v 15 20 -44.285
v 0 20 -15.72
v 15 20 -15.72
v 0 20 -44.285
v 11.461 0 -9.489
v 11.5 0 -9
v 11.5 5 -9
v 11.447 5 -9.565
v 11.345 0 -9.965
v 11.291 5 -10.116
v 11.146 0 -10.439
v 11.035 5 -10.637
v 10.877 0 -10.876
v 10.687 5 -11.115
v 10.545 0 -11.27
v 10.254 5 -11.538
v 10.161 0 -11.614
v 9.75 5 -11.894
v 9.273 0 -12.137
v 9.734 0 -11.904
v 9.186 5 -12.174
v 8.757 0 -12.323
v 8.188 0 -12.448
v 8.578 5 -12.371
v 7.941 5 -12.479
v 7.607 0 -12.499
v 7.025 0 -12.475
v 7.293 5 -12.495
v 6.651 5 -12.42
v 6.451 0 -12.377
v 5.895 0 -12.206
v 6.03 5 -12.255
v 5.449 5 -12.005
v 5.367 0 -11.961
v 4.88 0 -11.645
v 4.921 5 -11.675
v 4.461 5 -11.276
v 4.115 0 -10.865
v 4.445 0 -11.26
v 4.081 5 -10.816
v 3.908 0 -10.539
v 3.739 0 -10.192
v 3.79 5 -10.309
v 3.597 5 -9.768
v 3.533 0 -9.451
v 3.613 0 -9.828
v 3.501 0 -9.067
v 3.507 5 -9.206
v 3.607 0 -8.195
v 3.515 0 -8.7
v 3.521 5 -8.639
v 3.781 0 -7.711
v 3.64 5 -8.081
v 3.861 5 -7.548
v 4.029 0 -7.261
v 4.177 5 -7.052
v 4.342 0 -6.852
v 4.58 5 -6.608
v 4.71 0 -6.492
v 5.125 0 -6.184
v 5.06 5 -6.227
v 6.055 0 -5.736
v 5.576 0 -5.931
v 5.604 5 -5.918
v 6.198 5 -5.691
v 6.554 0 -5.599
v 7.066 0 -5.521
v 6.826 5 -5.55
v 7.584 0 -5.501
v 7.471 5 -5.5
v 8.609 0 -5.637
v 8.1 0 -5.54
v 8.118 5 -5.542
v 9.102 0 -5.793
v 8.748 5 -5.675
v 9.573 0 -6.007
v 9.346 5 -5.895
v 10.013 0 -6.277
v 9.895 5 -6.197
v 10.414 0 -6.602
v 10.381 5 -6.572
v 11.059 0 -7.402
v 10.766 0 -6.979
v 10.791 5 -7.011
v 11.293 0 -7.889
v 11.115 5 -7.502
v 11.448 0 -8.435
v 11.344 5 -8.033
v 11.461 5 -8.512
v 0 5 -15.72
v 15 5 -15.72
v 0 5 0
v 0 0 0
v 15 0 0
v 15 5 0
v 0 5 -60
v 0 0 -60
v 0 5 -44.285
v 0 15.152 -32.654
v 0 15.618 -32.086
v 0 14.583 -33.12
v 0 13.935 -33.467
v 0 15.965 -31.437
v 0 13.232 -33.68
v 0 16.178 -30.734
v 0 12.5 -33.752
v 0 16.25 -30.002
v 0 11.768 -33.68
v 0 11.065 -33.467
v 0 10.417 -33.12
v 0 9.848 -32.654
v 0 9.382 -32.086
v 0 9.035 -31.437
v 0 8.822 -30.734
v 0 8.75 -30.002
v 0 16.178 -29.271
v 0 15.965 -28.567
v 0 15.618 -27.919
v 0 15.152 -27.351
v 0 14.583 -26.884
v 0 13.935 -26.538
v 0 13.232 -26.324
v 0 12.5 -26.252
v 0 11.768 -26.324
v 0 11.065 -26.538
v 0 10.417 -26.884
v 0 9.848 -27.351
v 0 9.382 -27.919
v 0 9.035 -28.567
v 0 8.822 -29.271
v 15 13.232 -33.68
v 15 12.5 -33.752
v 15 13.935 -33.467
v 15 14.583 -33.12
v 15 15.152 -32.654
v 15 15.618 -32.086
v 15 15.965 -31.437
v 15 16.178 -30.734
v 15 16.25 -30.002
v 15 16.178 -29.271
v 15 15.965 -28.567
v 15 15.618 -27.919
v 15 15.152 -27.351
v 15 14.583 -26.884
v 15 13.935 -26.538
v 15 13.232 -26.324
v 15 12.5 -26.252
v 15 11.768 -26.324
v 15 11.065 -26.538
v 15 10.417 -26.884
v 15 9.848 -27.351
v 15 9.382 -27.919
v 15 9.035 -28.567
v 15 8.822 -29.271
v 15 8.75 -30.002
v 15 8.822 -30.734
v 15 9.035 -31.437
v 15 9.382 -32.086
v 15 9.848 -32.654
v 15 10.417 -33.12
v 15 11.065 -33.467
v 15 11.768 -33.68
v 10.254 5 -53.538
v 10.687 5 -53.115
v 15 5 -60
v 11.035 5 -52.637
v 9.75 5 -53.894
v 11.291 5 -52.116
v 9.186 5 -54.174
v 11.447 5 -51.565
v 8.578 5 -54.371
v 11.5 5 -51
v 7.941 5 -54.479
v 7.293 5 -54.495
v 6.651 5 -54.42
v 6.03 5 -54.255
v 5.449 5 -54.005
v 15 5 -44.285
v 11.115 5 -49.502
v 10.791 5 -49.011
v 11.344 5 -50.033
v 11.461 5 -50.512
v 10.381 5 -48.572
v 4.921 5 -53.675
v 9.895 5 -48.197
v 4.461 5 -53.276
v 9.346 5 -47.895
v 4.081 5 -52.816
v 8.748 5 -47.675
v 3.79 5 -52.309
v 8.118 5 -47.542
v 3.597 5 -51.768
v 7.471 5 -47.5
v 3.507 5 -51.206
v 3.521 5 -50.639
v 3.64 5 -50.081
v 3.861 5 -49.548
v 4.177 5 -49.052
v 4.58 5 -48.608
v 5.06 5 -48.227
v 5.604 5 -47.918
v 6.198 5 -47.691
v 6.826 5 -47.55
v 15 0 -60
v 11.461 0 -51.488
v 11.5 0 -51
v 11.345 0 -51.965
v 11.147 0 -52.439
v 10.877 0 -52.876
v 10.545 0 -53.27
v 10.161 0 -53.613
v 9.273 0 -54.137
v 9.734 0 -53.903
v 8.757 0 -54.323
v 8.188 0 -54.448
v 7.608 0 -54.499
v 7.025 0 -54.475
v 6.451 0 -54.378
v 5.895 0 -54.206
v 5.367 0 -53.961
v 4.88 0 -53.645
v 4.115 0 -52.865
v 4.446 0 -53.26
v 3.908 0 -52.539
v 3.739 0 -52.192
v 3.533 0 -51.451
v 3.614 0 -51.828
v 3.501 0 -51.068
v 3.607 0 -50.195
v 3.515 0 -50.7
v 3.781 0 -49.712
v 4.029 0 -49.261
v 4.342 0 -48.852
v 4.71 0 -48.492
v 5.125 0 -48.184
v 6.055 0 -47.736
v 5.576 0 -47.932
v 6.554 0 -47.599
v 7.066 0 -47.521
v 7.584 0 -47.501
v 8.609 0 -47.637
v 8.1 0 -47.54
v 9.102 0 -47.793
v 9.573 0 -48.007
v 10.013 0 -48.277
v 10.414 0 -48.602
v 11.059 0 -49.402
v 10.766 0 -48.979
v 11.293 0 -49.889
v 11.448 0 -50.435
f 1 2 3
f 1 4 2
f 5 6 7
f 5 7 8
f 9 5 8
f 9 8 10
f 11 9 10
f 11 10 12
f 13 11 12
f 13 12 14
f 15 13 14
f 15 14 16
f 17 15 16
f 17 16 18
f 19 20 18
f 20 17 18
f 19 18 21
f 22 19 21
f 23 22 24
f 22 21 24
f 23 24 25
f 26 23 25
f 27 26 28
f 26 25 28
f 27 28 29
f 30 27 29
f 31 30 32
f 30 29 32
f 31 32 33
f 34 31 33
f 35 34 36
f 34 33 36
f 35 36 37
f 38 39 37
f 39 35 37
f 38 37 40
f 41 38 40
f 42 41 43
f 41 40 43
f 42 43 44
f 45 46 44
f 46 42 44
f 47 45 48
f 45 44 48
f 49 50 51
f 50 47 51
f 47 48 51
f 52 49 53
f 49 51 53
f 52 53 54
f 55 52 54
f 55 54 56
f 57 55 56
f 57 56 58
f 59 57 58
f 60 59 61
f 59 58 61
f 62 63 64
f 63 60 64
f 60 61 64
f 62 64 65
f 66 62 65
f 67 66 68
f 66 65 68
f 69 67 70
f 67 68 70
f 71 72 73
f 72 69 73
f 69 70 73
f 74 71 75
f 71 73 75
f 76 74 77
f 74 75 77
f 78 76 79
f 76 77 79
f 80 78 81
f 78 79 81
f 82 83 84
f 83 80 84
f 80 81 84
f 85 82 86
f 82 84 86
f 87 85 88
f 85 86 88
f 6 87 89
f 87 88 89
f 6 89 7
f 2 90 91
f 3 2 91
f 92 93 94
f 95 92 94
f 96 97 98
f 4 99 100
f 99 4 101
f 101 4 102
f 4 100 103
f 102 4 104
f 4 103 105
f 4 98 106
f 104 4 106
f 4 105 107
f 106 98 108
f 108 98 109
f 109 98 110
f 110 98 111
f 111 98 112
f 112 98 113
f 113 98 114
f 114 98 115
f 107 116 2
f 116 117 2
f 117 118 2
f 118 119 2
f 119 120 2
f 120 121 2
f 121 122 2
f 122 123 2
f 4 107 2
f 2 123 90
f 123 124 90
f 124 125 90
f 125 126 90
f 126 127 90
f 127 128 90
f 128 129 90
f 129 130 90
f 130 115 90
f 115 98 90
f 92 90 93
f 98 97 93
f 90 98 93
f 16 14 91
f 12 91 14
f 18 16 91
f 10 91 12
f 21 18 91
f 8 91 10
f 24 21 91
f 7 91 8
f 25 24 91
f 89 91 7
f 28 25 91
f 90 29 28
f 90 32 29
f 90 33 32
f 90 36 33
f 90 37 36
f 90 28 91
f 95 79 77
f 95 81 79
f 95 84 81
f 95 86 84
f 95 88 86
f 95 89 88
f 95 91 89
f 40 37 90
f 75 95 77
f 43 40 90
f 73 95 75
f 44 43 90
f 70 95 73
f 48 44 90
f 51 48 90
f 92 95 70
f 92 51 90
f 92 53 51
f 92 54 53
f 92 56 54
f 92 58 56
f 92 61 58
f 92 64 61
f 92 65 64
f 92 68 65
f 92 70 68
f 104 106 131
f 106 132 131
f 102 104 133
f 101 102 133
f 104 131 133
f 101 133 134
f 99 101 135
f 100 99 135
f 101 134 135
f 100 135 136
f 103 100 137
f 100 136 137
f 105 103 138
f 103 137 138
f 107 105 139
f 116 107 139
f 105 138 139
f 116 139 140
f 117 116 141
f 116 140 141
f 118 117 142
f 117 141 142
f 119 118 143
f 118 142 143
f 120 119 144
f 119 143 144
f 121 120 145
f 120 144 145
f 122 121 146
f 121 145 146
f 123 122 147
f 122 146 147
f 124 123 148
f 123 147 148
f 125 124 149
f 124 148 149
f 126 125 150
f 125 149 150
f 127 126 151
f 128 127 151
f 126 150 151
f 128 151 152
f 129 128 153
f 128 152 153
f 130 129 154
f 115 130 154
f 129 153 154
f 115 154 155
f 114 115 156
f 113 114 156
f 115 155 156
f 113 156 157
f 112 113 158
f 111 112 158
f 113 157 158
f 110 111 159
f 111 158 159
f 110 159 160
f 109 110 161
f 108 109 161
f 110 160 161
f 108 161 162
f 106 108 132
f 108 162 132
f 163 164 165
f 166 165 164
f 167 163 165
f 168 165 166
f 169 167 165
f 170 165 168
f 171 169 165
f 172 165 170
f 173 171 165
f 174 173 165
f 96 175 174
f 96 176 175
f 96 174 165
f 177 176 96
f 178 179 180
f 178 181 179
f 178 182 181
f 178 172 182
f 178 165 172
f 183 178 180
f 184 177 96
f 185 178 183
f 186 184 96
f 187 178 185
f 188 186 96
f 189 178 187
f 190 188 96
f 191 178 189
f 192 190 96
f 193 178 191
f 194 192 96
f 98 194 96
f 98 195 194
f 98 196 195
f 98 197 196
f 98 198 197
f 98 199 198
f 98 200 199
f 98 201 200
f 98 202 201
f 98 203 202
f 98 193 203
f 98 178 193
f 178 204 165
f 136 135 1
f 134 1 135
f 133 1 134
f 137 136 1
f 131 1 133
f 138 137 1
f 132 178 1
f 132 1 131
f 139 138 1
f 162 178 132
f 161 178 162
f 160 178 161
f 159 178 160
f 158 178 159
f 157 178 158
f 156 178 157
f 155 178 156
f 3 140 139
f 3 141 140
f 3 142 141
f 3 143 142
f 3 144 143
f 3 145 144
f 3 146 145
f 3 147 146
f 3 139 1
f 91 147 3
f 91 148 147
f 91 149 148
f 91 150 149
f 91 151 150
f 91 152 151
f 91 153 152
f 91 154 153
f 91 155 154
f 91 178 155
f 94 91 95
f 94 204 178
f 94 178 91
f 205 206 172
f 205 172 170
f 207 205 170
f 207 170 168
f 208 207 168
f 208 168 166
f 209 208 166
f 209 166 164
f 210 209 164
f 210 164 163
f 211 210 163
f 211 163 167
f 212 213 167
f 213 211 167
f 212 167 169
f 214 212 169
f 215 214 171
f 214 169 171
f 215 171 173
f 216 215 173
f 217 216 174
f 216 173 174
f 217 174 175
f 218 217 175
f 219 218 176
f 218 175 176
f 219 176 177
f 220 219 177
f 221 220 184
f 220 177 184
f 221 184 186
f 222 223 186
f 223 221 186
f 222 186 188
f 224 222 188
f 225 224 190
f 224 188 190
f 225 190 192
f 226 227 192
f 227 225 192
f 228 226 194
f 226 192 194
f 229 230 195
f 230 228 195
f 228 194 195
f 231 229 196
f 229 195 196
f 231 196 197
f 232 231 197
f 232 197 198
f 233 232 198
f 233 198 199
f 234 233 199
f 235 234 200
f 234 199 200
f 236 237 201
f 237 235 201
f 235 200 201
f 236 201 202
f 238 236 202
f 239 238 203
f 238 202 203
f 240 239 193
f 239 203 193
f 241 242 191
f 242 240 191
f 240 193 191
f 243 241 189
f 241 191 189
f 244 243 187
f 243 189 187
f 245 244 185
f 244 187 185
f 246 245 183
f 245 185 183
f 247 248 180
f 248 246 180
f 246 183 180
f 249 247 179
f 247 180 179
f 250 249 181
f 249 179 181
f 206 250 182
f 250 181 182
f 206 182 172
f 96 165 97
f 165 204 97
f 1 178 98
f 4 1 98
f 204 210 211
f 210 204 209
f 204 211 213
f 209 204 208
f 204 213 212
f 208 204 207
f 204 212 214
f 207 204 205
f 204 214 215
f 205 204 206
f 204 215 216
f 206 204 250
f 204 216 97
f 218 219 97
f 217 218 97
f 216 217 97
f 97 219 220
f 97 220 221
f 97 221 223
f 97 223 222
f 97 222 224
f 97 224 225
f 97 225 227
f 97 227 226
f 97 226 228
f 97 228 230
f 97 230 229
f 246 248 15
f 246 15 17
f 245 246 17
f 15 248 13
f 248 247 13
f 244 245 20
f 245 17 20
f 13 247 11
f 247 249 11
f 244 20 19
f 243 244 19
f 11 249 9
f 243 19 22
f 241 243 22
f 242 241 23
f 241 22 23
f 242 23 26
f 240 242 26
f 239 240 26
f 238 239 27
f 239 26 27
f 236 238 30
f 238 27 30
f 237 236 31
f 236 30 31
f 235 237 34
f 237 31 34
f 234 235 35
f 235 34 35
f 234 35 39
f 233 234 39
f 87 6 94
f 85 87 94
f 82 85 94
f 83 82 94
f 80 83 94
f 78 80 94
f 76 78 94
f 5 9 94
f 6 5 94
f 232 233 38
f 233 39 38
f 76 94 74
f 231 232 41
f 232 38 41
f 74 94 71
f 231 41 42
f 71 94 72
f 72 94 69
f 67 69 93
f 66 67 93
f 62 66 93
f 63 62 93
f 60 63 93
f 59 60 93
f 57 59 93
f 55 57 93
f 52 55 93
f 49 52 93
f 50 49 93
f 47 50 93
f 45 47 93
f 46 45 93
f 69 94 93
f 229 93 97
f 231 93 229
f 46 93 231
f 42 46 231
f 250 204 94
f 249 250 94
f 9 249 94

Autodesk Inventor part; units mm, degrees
ref_plane "YZ Plane" through (0, 0, 0) normal (1, 0, 0) x (0, 1, 0)
ref_plane "XZ Plane" through (0, 0, 0) normal (0, 1, 0) x (-1, 0, 0)
ref_plane "XY Plane" through (0, 0, 0) normal (0, 0, 1) x (1, 0, 0)
sketch "Sketch1" plane through (0, 0, 0) normal (0, 1, 0) x (-1, 0, 0)
  line L0 (0, 0) -> (-20, 0)
  line L1 (-20, 0) -> (-20, -60)
  line L2 (-20, -60) -> (0, -60)
  line L3 (0, -60) -> (0, 0)
  line L4 (0, -60) -> (-15, -60)
  line L5 (0, -60) -> (15, -60) construction
  line L6 (-15, -60) -> (-15, 0)
  dimension "d0" = 20
  dimension "d1" = 60
  dimension "d14" = 15
  dimension "d15" = 180
extrude "Extrusion1" add sketch "Sketch1" along normal blind 5
sketch "Sketch2" plane through (0, 5, 0) normal (0, 1, 0) x (1, 0, 0)
  line L0 (10, 0) -> (19, 0) construction
  line L1 (0, 0) -> (20, 0) projected
  line L2 (0, 0) -> (15, 0) construction
  line L3 (7.5, 0) -> (16.5, 0) construction
  line L4 (0, 60) -> (0, 0) construction
  line L5 (7.5, 9) -> (0, 9) construction
  circle A0 centre (7.5, 51) radius 0.425 construction
  line L6 (7.5, 51) -> (1.0192, 51) construction
  line L7 (7.5, 51) -> (7.5, 47.5) construction
  line L8 (7.5, 51) -> (11.5, 51) construction
  ellipse E0 centre (7.5, 51) end of major axis (11.5, 51) minor radius 3.5
  line L9 (20, 0) -> (20, 60) construction
  line L10 (20, 30) -> (0, 30) construction
  ellipse E1 centre (7.5, 9) end of major axis (11.5, 9) minor radius 3.5
  dimension "d30" = 0.85
  dimension "d32" = 3.5
  dimension "d33" = 4
sketch "Sketch3" plane through (0, 5, 0) normal (0, 1, 0) x (1, 0, 0)
  line L0 (0, 60) -> (0, 0) projected
  line L1 (20, 0) -> (20, 60) projected
  line L2 (0, 15.7197) -> (20, 15.7197)
  line L3 (20, 15.7197) -> (20, 44.2851)
  line L4 (20, 44.2851) -> (0, 44.2851)
  line L5 (0, 44.2851) -> (0, 15.7197)
extrude "Extrusion3" add sketch "Sketch3" along normal blind 15
sketch "Sketch4" plane through (20, 0, 0) normal (1, 0, 0) x (0, 0, -1)
  line L0 (15.7197, 5) -> (15.7197, 20) projected
  line L1 (44.2851, 5) -> (60, 5) projected
  circle A0 centre (30.0024, 12.5) radius 3.75
  point P0 (0, 0)
  dimension "d11" = 7.5
extrude "Extrusion4" cut sketch "Sketch4" against normal blind 65.5
extrude "Extrusion5" add sketch "Sketch1" along normal blind 5 contours L3 L2 L6 L0
extrude "Extrusion6" cut sketch "Sketch1" along normal blind 22.5 contours L6 L2 L1 L0
extrude "Extrusion9" cut sketch "Sketch2" against normal blind 10
properties part number "SuperiorBancada"
